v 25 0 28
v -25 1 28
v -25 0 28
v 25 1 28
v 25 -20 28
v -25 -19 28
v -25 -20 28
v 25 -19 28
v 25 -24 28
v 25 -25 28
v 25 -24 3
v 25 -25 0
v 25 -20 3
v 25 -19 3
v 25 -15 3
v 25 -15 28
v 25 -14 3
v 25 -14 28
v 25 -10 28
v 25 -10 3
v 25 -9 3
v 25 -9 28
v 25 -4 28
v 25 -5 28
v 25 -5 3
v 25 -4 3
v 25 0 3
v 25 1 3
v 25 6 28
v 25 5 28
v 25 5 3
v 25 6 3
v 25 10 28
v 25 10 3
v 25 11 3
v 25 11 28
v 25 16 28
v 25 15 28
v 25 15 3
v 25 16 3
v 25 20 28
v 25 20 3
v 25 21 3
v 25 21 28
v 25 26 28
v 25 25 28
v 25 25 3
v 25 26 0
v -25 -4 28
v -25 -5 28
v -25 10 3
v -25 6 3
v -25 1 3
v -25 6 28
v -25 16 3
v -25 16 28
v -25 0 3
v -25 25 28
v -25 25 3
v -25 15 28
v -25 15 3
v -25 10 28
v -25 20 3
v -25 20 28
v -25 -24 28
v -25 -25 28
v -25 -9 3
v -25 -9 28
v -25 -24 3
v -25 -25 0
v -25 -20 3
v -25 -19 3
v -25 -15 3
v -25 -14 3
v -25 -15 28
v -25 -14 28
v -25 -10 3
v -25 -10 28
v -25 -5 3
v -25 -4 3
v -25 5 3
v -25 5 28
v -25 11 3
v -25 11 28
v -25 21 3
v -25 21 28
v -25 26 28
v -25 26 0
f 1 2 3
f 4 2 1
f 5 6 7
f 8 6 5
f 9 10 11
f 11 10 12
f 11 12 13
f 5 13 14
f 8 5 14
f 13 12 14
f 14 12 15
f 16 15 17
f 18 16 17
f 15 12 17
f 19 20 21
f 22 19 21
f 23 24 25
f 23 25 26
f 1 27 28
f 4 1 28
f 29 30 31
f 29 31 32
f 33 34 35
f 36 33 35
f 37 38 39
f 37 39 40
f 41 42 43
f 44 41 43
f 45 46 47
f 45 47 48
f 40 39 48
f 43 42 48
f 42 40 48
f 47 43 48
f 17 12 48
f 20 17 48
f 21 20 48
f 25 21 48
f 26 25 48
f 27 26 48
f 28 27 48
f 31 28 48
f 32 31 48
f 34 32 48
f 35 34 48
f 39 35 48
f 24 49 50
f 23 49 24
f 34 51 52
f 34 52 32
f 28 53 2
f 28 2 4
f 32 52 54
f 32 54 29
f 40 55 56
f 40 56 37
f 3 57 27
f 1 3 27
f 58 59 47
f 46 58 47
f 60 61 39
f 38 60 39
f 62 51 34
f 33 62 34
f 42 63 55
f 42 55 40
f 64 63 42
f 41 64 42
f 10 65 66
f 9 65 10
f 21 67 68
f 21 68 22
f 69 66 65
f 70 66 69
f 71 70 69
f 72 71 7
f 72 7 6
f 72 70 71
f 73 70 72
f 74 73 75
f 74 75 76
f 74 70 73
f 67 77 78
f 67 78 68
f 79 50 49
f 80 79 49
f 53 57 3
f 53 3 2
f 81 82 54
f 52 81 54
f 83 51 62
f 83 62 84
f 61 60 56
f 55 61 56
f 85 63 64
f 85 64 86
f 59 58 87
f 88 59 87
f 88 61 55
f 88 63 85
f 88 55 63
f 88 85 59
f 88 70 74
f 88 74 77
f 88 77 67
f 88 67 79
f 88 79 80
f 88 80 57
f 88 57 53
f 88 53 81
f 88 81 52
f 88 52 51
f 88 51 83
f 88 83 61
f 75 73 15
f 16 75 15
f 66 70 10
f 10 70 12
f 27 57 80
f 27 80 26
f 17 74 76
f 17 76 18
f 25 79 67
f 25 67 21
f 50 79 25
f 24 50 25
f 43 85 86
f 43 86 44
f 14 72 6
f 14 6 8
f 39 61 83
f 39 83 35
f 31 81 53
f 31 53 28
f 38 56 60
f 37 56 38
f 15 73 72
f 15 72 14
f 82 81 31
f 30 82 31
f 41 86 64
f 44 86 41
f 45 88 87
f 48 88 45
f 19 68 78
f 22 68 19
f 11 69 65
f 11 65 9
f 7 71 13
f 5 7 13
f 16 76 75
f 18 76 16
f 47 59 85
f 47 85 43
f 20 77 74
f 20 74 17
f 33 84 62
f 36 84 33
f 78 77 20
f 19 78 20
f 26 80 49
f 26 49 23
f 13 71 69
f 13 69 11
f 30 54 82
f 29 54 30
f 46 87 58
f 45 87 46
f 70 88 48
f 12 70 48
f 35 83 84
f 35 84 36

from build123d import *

# Parameters (mm, degrees)
CYLINDER_R     = 10
CYLINDER_DEPTH = 2
BOX_W          = 50
BOX_H          = 51
BOX_DEPTH      = 3
BOX001_W       = 50
BOX001_H       = 1
BOX001_DEPTH   = 25
ARRAY_Y_COUNT  = 11
ARRAY_Y_PITCH  = 5


with BuildPart() as cylinder:
    # Cylinder → Cylinder (new body)
    with BuildSketch(Plane.XY):
        Circle(CYLINDER_R)
    extrude(amount=CYLINDER_DEPTH)


with BuildPart() as cube:
    # Box → Box (new body)
    with BuildSketch(Plane(origin=(-25, -25, 0), x_dir=(1, 0, 0), z_dir=(0, 0, 1))):
        with Locations((25, 25.5)):
            Rectangle(BOX_W, BOX_H)
    extrude(amount=BOX_DEPTH)


with BuildPart() as fusion:
    # Box001 → Box001 (new body)
    with BuildSketch(Plane(origin=(-25, -25, 3), x_dir=(1, 0, 0), z_dir=(0, 0, 1))):
        with Locations((25, 0.5)):
            Rectangle(BOX001_W, BOX001_H)
    extrude(amount=BOX001_DEPTH)

    # Array Y: Fusion ×11


with BuildPart() as fusion_1:
    add(fusion.part)
    with Locations(*[(0, i * ARRAY_Y_PITCH, 0) for i in range(1, ARRAY_Y_COUNT)]):
        add(fusion.part)

    # Fusion: union Cylinder, Cube
    add(cylinder.part)
    add(cube.part)


solid = fusion_1.part
